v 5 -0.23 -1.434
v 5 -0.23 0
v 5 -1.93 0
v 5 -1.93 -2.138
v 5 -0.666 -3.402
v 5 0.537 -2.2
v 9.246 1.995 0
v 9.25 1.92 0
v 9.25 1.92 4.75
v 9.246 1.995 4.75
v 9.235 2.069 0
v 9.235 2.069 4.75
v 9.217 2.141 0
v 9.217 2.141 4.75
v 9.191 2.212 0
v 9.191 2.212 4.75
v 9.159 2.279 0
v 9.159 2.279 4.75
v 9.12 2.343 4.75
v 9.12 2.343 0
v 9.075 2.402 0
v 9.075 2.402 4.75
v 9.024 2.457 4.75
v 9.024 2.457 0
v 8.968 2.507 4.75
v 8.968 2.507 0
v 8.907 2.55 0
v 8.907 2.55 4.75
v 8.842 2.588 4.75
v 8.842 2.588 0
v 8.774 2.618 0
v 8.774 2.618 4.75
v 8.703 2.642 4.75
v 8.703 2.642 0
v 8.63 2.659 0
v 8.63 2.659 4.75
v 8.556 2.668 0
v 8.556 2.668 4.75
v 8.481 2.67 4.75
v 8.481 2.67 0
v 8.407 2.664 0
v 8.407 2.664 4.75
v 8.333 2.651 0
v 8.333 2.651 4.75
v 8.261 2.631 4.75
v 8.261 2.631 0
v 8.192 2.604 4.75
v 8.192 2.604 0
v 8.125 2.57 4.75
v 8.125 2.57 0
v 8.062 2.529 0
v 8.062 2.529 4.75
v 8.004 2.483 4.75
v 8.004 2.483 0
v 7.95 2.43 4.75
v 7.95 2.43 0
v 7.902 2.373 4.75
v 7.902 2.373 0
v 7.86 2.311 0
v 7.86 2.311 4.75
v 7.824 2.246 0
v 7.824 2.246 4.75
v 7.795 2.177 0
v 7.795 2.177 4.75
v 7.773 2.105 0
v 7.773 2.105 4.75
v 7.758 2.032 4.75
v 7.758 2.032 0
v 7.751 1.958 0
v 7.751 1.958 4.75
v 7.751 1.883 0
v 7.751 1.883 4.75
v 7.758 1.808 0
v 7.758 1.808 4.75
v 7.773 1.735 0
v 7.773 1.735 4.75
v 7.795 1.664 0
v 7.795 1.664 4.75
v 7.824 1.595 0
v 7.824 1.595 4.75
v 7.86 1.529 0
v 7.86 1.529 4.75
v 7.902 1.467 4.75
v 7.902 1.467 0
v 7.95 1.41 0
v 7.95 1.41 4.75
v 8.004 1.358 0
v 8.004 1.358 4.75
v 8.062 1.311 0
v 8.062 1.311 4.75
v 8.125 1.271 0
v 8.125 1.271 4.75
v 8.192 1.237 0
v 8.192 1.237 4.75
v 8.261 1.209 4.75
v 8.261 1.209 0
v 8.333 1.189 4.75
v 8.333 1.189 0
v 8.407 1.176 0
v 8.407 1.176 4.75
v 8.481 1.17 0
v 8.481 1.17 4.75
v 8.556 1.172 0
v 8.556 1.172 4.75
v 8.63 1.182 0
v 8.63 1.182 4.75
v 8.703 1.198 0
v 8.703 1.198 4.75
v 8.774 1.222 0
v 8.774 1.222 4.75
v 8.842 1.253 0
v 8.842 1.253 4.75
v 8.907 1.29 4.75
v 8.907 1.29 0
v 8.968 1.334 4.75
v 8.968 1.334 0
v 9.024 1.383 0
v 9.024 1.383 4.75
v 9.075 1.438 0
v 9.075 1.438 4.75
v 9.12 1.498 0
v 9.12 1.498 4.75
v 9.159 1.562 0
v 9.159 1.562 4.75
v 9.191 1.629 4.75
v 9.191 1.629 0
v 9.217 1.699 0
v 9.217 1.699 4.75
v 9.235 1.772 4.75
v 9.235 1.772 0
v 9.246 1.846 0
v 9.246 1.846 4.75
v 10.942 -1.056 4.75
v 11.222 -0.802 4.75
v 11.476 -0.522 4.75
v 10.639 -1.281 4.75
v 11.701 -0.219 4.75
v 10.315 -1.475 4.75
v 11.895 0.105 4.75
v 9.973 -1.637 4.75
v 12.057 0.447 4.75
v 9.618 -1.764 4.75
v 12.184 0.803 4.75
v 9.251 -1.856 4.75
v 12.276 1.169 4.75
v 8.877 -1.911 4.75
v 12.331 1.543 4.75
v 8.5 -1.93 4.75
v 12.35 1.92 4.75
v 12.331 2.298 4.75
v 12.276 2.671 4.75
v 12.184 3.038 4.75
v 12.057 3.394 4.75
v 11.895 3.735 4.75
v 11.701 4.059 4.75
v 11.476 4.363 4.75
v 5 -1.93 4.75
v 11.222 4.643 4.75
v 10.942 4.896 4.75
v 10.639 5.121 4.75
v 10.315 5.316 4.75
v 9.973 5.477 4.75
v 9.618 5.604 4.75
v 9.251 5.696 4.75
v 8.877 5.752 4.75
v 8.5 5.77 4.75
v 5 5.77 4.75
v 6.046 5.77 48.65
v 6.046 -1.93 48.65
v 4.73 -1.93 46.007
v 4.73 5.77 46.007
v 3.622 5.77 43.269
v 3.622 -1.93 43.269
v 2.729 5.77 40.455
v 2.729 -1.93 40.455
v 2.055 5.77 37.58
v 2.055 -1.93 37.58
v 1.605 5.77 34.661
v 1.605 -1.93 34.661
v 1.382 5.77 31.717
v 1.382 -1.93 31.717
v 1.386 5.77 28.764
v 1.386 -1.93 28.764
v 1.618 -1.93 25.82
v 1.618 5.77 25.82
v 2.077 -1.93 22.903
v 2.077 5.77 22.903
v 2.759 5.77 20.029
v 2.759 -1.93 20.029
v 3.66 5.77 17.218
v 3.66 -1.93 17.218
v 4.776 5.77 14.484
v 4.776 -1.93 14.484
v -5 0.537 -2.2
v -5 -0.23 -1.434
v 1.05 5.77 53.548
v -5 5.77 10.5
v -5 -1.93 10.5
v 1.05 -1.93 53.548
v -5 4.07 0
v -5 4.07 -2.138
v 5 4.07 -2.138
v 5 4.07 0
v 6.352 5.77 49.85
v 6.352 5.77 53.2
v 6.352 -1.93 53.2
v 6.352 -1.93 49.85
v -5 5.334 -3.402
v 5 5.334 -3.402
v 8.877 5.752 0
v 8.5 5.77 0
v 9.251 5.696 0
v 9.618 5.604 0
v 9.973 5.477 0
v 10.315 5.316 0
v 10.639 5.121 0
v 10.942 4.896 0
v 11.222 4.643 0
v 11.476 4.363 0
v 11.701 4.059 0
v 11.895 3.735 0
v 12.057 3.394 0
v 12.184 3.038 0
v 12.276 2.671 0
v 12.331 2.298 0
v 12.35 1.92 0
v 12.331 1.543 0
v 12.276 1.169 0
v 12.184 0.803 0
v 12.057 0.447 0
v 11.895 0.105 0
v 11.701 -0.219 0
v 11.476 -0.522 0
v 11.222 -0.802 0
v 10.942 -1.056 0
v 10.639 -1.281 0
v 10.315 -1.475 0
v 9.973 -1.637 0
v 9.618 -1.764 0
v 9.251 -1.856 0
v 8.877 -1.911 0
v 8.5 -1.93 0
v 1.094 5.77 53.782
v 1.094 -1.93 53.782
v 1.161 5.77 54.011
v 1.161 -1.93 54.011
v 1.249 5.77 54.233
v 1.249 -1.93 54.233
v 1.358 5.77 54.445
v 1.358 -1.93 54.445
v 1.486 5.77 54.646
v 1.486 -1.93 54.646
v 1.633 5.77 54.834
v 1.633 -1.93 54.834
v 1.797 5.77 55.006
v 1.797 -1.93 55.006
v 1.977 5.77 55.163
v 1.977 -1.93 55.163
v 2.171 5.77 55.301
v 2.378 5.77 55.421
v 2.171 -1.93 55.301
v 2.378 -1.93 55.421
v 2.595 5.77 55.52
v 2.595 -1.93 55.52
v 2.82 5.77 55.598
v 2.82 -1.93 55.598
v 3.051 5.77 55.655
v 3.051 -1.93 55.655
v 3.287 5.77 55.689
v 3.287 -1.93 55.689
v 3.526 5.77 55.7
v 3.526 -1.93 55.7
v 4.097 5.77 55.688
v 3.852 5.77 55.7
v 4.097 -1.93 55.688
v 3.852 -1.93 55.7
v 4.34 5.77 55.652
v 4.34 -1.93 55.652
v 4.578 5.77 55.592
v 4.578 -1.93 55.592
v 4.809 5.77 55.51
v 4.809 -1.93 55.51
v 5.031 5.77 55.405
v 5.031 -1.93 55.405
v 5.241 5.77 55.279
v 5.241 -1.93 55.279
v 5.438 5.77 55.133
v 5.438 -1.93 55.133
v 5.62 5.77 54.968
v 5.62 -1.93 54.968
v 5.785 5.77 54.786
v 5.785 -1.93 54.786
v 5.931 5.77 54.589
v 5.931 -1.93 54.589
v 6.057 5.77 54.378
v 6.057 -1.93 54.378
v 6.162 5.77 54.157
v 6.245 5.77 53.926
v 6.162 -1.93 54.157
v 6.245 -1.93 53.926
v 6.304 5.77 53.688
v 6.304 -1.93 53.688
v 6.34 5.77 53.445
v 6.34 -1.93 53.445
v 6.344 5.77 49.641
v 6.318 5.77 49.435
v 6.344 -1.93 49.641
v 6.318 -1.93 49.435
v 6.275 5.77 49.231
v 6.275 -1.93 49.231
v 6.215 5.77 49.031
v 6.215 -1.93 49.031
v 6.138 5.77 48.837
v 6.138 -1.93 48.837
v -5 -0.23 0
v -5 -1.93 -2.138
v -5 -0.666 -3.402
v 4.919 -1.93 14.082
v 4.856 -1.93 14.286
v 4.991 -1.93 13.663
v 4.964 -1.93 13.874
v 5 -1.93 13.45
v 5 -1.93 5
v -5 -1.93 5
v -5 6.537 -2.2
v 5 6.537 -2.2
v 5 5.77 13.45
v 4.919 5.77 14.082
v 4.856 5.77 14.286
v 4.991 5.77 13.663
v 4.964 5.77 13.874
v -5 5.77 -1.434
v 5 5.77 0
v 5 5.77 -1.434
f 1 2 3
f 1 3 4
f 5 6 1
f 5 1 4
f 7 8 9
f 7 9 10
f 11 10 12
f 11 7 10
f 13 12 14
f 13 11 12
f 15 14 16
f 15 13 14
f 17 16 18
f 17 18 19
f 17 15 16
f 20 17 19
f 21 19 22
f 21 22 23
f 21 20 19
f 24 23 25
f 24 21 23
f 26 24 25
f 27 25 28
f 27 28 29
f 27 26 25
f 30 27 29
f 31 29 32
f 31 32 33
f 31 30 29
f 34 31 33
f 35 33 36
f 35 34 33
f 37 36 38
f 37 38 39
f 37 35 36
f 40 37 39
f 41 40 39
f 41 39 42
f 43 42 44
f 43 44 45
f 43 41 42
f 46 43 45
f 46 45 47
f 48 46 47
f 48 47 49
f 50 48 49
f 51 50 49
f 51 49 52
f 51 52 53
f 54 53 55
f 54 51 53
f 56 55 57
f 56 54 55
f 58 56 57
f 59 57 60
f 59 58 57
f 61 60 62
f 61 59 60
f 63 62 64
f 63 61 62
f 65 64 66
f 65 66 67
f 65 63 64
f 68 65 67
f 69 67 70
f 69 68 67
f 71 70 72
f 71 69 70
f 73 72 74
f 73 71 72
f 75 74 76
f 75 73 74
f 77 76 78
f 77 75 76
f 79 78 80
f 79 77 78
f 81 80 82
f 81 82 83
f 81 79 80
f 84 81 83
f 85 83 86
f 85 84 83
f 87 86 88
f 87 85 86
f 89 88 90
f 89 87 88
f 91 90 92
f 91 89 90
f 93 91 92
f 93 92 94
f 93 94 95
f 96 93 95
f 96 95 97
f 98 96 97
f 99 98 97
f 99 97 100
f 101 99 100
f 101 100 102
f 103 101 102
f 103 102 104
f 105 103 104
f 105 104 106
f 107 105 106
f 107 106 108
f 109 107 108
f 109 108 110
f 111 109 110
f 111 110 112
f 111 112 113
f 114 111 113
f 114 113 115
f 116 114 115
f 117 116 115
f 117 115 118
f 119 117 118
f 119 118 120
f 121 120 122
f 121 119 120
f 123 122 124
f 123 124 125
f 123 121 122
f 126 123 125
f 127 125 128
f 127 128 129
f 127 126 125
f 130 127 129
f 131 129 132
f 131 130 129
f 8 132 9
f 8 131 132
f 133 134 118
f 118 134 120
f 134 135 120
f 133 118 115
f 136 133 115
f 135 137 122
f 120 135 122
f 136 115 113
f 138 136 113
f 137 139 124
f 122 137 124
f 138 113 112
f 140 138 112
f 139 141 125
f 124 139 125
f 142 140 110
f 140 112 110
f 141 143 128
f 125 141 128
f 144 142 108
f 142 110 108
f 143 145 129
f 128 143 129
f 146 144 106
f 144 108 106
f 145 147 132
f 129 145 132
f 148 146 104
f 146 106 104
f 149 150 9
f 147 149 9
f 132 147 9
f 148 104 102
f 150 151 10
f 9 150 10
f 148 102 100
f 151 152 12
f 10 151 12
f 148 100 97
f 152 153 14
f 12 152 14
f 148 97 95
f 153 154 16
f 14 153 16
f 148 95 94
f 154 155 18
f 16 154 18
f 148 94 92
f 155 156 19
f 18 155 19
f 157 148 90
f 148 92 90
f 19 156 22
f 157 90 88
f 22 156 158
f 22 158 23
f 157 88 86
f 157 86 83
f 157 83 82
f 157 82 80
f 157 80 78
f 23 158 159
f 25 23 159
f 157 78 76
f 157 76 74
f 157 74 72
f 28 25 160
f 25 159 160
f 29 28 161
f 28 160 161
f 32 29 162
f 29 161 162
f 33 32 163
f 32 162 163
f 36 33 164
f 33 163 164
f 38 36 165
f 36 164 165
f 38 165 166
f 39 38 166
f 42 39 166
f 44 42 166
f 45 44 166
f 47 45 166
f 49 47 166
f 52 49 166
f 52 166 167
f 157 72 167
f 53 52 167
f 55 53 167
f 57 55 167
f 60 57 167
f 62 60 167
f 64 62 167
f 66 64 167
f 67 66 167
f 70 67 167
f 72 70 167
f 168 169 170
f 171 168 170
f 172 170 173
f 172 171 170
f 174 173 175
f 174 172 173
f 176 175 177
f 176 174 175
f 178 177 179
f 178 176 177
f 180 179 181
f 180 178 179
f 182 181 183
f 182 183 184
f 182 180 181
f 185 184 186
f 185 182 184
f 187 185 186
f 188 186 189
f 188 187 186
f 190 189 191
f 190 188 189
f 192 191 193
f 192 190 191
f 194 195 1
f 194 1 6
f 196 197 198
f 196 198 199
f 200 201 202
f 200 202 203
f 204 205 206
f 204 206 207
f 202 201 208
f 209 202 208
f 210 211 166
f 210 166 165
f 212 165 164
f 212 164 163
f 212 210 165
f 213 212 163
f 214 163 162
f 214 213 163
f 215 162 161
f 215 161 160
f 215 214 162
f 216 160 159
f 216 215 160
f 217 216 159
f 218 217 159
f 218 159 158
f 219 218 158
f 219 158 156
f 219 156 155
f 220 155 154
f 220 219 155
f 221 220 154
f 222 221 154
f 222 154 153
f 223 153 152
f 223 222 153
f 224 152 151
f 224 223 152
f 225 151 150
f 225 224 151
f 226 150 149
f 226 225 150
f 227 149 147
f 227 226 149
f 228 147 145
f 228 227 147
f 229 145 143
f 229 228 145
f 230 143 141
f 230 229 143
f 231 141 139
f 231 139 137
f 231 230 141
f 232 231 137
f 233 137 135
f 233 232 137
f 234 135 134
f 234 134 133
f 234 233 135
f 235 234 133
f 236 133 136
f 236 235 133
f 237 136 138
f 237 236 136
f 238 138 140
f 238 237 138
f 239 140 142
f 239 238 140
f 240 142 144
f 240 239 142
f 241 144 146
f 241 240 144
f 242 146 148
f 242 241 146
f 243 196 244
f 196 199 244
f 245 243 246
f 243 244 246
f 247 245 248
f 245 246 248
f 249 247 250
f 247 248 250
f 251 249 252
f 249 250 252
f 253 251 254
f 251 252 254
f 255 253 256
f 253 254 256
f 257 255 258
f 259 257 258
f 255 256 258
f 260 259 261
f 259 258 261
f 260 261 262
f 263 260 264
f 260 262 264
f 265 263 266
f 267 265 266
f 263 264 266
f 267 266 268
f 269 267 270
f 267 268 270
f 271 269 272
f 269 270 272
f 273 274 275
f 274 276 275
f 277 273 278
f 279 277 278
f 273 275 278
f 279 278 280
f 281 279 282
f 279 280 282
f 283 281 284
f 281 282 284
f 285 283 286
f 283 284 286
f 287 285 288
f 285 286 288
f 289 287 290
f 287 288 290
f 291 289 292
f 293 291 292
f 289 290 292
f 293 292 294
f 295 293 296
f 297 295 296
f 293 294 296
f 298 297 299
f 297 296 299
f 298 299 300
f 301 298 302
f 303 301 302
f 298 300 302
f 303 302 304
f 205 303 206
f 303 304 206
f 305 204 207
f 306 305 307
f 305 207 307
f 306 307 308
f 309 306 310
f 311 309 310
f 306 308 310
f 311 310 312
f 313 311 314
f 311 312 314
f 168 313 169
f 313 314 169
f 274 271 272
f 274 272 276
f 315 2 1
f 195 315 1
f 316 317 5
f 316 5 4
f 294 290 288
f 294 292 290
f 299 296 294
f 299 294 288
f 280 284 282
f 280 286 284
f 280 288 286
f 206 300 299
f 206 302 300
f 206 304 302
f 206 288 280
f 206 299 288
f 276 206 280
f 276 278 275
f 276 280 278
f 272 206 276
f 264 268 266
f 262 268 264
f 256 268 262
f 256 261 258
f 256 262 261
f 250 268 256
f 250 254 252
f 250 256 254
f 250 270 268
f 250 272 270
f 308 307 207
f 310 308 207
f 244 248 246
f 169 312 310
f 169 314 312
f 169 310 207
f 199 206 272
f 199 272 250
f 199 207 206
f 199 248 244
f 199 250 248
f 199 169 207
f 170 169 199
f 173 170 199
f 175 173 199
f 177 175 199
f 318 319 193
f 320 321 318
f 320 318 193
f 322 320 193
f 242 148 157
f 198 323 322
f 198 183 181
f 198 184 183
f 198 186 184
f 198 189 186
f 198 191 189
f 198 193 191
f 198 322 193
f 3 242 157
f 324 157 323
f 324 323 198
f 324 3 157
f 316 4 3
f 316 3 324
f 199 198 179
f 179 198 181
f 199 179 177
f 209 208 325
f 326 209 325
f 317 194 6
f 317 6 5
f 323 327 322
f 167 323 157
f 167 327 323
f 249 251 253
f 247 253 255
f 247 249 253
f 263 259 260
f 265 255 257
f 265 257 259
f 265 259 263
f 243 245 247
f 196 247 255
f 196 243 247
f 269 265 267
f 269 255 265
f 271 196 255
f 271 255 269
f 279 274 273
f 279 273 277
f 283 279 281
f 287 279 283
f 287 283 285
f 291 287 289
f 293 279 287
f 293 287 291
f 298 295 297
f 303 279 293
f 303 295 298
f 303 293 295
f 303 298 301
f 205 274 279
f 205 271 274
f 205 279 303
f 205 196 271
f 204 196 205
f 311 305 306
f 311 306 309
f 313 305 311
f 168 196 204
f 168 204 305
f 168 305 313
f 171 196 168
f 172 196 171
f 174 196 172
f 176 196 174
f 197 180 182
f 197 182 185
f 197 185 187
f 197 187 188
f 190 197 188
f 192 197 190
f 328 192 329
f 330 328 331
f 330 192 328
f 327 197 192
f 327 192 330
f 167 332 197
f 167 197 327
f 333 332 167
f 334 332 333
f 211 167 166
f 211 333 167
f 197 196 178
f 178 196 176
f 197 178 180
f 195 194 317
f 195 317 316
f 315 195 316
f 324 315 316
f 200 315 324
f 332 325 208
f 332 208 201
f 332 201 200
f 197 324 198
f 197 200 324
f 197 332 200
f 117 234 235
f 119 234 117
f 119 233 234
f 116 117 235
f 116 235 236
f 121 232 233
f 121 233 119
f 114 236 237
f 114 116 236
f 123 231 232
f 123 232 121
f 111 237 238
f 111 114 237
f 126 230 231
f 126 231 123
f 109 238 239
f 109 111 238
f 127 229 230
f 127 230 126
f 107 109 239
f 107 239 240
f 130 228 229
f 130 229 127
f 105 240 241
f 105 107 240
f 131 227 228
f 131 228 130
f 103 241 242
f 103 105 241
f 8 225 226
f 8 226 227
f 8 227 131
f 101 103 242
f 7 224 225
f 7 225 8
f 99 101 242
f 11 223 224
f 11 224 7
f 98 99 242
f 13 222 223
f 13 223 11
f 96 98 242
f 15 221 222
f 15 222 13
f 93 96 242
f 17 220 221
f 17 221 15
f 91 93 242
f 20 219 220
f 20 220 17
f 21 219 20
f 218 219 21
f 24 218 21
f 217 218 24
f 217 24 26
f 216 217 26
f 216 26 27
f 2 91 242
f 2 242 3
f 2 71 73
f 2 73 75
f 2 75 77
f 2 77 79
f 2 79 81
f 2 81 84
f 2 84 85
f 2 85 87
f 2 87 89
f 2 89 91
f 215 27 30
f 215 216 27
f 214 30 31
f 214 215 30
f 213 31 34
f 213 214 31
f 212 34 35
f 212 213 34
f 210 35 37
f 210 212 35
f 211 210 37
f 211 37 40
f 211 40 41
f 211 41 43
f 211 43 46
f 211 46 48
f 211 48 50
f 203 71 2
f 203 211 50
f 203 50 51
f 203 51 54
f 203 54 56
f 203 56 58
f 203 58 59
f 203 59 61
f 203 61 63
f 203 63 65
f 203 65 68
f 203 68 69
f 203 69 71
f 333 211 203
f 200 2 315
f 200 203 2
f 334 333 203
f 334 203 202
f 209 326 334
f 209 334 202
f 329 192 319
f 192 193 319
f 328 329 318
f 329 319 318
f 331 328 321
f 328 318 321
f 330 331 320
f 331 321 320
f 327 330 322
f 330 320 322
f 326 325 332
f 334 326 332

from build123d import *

# Parameters (mm, degrees)
SKETCH2_W           = 10
SKETCH2_H           = 14.768412439
BOSS_EXTRUDE1_DEPTH = 5
BOSS_EXTRUDE4_DEPTH = 10
SKETCH9_W           = 10
SKETCH9_H           = 3.18
SKETCH9_H_2         = 3.888412439
CUT_EXTRUDE3_DEPTH  = 5
BOSS_EXTRUDE5_DEPTH = 7.7
SKETCH12_R          = 0.75
BOSS_EXTRUDE7_DEPTH = 4.75
FILLET1_R           = 2.5


with BuildPart() as part:
    # Sketch2 → Boss-Extrude1 (new body)
    with BuildSketch(Plane.XY):
        with Locations((0, 1.566049366)):
            Rectangle(SKETCH2_W, SKETCH2_H)
    extrude(amount=BOSS_EXTRUDE1_DEPTH)

    # Sketch8 → Boss-Extrude4 (add)
    with BuildSketch(Plane.ZY.offset(5)):
        Polygon((-0.15, 5.770255585), (0, 5.770255585), (0, 4.070255585), (-0.15, 4.070255585), (-2.137867966, 4.070255585), (-3.402081528, 5.334469147), (-2.2, 6.536550675), (-1.43370491, 5.770255585), align=None)
        Polygon((-0.15, -1.929744415), (0, -1.929744415), (0, -0.229744415), (-0.15, -0.229744415), (-1.43370491, -0.229744415), (-2.2, 0.536550675), (-3.402081528, -0.665530853), (-2.137867966, -1.929744415), align=None)
    extrude(amount=-BOSS_EXTRUDE4_DEPTH)

    # Sketch9 → Cut-Extrude3 (cut)
    with BuildSketch(Plane(origin=(0, 0, 0), x_dir=(-1, 0, 0), z_dir=(0, 0, -1))):
        with Locations((0, 7.360255585)):
            Rectangle(SKETCH9_W, SKETCH9_H)
        with Locations((0, -3.873950635)):
            Rectangle(SKETCH9_W, SKETCH9_H_2)
    extrude(amount=-CUT_EXTRUDE3_DEPTH, mode=Mode.SUBTRACT)

    # Sketch10 → Boss-Extrude5 (add)
    with BuildSketch(Plane(origin=(0, 5.770255585, 0), x_dir=(1, 0, 0), z_dir=(0, 1, 0))):
        with BuildLine():
            Line((-5, -5), (-5, -10.5))
            Line((-5, -10.5), (1.352445729, -55.7))
            Line((1.352445729, -55.7), (6.352445729, -55.7))
            Line((6.352445729, -55.7), (6.352445729, -49.2))
            ThreePointArc((6.352445729, -49.2), (1.383429579, -31.764936646), (5, -14))
            Line((5, -14), (5, -5))
            Line((5, -5), (-5, -5))
        make_face()
    extrude(amount=-BOSS_EXTRUDE5_DEPTH)

    # Sketch12 → Boss-Extrude7 (add)
    with BuildSketch(Plane.XY):
        with BuildLine():
            Line((5, 5.770255585), (8.5, 5.770255585))
            ThreePointArc((8.5, 5.770255585), (12.35, 1.920255585), (8.5, -1.929744415))
            Line((8.5, -1.929744415), (5, -1.929744415))
            Line((5, -1.929744415), (5, 5.770255585))
        make_face()
        with Locations((8.5, 1.920255585)):
            Circle(SKETCH12_R, mode=Mode.SUBTRACT)
    extrude(amount=BOSS_EXTRUDE7_DEPTH)

    # Fillet1
    fillet1_edges = [part.edges().sort_by_distance(p)[0] for p in [
        (6.352445729, 1.920255585, 49.2),
        (5, 1.920255585, 14),
        (1.352445729, 1.920255585, 55.7),
        (6.352445729, 1.920255585, 55.7),
    ]]
    fillet(fillet1_edges, radius=FILLET1_R)


solid = part.part
